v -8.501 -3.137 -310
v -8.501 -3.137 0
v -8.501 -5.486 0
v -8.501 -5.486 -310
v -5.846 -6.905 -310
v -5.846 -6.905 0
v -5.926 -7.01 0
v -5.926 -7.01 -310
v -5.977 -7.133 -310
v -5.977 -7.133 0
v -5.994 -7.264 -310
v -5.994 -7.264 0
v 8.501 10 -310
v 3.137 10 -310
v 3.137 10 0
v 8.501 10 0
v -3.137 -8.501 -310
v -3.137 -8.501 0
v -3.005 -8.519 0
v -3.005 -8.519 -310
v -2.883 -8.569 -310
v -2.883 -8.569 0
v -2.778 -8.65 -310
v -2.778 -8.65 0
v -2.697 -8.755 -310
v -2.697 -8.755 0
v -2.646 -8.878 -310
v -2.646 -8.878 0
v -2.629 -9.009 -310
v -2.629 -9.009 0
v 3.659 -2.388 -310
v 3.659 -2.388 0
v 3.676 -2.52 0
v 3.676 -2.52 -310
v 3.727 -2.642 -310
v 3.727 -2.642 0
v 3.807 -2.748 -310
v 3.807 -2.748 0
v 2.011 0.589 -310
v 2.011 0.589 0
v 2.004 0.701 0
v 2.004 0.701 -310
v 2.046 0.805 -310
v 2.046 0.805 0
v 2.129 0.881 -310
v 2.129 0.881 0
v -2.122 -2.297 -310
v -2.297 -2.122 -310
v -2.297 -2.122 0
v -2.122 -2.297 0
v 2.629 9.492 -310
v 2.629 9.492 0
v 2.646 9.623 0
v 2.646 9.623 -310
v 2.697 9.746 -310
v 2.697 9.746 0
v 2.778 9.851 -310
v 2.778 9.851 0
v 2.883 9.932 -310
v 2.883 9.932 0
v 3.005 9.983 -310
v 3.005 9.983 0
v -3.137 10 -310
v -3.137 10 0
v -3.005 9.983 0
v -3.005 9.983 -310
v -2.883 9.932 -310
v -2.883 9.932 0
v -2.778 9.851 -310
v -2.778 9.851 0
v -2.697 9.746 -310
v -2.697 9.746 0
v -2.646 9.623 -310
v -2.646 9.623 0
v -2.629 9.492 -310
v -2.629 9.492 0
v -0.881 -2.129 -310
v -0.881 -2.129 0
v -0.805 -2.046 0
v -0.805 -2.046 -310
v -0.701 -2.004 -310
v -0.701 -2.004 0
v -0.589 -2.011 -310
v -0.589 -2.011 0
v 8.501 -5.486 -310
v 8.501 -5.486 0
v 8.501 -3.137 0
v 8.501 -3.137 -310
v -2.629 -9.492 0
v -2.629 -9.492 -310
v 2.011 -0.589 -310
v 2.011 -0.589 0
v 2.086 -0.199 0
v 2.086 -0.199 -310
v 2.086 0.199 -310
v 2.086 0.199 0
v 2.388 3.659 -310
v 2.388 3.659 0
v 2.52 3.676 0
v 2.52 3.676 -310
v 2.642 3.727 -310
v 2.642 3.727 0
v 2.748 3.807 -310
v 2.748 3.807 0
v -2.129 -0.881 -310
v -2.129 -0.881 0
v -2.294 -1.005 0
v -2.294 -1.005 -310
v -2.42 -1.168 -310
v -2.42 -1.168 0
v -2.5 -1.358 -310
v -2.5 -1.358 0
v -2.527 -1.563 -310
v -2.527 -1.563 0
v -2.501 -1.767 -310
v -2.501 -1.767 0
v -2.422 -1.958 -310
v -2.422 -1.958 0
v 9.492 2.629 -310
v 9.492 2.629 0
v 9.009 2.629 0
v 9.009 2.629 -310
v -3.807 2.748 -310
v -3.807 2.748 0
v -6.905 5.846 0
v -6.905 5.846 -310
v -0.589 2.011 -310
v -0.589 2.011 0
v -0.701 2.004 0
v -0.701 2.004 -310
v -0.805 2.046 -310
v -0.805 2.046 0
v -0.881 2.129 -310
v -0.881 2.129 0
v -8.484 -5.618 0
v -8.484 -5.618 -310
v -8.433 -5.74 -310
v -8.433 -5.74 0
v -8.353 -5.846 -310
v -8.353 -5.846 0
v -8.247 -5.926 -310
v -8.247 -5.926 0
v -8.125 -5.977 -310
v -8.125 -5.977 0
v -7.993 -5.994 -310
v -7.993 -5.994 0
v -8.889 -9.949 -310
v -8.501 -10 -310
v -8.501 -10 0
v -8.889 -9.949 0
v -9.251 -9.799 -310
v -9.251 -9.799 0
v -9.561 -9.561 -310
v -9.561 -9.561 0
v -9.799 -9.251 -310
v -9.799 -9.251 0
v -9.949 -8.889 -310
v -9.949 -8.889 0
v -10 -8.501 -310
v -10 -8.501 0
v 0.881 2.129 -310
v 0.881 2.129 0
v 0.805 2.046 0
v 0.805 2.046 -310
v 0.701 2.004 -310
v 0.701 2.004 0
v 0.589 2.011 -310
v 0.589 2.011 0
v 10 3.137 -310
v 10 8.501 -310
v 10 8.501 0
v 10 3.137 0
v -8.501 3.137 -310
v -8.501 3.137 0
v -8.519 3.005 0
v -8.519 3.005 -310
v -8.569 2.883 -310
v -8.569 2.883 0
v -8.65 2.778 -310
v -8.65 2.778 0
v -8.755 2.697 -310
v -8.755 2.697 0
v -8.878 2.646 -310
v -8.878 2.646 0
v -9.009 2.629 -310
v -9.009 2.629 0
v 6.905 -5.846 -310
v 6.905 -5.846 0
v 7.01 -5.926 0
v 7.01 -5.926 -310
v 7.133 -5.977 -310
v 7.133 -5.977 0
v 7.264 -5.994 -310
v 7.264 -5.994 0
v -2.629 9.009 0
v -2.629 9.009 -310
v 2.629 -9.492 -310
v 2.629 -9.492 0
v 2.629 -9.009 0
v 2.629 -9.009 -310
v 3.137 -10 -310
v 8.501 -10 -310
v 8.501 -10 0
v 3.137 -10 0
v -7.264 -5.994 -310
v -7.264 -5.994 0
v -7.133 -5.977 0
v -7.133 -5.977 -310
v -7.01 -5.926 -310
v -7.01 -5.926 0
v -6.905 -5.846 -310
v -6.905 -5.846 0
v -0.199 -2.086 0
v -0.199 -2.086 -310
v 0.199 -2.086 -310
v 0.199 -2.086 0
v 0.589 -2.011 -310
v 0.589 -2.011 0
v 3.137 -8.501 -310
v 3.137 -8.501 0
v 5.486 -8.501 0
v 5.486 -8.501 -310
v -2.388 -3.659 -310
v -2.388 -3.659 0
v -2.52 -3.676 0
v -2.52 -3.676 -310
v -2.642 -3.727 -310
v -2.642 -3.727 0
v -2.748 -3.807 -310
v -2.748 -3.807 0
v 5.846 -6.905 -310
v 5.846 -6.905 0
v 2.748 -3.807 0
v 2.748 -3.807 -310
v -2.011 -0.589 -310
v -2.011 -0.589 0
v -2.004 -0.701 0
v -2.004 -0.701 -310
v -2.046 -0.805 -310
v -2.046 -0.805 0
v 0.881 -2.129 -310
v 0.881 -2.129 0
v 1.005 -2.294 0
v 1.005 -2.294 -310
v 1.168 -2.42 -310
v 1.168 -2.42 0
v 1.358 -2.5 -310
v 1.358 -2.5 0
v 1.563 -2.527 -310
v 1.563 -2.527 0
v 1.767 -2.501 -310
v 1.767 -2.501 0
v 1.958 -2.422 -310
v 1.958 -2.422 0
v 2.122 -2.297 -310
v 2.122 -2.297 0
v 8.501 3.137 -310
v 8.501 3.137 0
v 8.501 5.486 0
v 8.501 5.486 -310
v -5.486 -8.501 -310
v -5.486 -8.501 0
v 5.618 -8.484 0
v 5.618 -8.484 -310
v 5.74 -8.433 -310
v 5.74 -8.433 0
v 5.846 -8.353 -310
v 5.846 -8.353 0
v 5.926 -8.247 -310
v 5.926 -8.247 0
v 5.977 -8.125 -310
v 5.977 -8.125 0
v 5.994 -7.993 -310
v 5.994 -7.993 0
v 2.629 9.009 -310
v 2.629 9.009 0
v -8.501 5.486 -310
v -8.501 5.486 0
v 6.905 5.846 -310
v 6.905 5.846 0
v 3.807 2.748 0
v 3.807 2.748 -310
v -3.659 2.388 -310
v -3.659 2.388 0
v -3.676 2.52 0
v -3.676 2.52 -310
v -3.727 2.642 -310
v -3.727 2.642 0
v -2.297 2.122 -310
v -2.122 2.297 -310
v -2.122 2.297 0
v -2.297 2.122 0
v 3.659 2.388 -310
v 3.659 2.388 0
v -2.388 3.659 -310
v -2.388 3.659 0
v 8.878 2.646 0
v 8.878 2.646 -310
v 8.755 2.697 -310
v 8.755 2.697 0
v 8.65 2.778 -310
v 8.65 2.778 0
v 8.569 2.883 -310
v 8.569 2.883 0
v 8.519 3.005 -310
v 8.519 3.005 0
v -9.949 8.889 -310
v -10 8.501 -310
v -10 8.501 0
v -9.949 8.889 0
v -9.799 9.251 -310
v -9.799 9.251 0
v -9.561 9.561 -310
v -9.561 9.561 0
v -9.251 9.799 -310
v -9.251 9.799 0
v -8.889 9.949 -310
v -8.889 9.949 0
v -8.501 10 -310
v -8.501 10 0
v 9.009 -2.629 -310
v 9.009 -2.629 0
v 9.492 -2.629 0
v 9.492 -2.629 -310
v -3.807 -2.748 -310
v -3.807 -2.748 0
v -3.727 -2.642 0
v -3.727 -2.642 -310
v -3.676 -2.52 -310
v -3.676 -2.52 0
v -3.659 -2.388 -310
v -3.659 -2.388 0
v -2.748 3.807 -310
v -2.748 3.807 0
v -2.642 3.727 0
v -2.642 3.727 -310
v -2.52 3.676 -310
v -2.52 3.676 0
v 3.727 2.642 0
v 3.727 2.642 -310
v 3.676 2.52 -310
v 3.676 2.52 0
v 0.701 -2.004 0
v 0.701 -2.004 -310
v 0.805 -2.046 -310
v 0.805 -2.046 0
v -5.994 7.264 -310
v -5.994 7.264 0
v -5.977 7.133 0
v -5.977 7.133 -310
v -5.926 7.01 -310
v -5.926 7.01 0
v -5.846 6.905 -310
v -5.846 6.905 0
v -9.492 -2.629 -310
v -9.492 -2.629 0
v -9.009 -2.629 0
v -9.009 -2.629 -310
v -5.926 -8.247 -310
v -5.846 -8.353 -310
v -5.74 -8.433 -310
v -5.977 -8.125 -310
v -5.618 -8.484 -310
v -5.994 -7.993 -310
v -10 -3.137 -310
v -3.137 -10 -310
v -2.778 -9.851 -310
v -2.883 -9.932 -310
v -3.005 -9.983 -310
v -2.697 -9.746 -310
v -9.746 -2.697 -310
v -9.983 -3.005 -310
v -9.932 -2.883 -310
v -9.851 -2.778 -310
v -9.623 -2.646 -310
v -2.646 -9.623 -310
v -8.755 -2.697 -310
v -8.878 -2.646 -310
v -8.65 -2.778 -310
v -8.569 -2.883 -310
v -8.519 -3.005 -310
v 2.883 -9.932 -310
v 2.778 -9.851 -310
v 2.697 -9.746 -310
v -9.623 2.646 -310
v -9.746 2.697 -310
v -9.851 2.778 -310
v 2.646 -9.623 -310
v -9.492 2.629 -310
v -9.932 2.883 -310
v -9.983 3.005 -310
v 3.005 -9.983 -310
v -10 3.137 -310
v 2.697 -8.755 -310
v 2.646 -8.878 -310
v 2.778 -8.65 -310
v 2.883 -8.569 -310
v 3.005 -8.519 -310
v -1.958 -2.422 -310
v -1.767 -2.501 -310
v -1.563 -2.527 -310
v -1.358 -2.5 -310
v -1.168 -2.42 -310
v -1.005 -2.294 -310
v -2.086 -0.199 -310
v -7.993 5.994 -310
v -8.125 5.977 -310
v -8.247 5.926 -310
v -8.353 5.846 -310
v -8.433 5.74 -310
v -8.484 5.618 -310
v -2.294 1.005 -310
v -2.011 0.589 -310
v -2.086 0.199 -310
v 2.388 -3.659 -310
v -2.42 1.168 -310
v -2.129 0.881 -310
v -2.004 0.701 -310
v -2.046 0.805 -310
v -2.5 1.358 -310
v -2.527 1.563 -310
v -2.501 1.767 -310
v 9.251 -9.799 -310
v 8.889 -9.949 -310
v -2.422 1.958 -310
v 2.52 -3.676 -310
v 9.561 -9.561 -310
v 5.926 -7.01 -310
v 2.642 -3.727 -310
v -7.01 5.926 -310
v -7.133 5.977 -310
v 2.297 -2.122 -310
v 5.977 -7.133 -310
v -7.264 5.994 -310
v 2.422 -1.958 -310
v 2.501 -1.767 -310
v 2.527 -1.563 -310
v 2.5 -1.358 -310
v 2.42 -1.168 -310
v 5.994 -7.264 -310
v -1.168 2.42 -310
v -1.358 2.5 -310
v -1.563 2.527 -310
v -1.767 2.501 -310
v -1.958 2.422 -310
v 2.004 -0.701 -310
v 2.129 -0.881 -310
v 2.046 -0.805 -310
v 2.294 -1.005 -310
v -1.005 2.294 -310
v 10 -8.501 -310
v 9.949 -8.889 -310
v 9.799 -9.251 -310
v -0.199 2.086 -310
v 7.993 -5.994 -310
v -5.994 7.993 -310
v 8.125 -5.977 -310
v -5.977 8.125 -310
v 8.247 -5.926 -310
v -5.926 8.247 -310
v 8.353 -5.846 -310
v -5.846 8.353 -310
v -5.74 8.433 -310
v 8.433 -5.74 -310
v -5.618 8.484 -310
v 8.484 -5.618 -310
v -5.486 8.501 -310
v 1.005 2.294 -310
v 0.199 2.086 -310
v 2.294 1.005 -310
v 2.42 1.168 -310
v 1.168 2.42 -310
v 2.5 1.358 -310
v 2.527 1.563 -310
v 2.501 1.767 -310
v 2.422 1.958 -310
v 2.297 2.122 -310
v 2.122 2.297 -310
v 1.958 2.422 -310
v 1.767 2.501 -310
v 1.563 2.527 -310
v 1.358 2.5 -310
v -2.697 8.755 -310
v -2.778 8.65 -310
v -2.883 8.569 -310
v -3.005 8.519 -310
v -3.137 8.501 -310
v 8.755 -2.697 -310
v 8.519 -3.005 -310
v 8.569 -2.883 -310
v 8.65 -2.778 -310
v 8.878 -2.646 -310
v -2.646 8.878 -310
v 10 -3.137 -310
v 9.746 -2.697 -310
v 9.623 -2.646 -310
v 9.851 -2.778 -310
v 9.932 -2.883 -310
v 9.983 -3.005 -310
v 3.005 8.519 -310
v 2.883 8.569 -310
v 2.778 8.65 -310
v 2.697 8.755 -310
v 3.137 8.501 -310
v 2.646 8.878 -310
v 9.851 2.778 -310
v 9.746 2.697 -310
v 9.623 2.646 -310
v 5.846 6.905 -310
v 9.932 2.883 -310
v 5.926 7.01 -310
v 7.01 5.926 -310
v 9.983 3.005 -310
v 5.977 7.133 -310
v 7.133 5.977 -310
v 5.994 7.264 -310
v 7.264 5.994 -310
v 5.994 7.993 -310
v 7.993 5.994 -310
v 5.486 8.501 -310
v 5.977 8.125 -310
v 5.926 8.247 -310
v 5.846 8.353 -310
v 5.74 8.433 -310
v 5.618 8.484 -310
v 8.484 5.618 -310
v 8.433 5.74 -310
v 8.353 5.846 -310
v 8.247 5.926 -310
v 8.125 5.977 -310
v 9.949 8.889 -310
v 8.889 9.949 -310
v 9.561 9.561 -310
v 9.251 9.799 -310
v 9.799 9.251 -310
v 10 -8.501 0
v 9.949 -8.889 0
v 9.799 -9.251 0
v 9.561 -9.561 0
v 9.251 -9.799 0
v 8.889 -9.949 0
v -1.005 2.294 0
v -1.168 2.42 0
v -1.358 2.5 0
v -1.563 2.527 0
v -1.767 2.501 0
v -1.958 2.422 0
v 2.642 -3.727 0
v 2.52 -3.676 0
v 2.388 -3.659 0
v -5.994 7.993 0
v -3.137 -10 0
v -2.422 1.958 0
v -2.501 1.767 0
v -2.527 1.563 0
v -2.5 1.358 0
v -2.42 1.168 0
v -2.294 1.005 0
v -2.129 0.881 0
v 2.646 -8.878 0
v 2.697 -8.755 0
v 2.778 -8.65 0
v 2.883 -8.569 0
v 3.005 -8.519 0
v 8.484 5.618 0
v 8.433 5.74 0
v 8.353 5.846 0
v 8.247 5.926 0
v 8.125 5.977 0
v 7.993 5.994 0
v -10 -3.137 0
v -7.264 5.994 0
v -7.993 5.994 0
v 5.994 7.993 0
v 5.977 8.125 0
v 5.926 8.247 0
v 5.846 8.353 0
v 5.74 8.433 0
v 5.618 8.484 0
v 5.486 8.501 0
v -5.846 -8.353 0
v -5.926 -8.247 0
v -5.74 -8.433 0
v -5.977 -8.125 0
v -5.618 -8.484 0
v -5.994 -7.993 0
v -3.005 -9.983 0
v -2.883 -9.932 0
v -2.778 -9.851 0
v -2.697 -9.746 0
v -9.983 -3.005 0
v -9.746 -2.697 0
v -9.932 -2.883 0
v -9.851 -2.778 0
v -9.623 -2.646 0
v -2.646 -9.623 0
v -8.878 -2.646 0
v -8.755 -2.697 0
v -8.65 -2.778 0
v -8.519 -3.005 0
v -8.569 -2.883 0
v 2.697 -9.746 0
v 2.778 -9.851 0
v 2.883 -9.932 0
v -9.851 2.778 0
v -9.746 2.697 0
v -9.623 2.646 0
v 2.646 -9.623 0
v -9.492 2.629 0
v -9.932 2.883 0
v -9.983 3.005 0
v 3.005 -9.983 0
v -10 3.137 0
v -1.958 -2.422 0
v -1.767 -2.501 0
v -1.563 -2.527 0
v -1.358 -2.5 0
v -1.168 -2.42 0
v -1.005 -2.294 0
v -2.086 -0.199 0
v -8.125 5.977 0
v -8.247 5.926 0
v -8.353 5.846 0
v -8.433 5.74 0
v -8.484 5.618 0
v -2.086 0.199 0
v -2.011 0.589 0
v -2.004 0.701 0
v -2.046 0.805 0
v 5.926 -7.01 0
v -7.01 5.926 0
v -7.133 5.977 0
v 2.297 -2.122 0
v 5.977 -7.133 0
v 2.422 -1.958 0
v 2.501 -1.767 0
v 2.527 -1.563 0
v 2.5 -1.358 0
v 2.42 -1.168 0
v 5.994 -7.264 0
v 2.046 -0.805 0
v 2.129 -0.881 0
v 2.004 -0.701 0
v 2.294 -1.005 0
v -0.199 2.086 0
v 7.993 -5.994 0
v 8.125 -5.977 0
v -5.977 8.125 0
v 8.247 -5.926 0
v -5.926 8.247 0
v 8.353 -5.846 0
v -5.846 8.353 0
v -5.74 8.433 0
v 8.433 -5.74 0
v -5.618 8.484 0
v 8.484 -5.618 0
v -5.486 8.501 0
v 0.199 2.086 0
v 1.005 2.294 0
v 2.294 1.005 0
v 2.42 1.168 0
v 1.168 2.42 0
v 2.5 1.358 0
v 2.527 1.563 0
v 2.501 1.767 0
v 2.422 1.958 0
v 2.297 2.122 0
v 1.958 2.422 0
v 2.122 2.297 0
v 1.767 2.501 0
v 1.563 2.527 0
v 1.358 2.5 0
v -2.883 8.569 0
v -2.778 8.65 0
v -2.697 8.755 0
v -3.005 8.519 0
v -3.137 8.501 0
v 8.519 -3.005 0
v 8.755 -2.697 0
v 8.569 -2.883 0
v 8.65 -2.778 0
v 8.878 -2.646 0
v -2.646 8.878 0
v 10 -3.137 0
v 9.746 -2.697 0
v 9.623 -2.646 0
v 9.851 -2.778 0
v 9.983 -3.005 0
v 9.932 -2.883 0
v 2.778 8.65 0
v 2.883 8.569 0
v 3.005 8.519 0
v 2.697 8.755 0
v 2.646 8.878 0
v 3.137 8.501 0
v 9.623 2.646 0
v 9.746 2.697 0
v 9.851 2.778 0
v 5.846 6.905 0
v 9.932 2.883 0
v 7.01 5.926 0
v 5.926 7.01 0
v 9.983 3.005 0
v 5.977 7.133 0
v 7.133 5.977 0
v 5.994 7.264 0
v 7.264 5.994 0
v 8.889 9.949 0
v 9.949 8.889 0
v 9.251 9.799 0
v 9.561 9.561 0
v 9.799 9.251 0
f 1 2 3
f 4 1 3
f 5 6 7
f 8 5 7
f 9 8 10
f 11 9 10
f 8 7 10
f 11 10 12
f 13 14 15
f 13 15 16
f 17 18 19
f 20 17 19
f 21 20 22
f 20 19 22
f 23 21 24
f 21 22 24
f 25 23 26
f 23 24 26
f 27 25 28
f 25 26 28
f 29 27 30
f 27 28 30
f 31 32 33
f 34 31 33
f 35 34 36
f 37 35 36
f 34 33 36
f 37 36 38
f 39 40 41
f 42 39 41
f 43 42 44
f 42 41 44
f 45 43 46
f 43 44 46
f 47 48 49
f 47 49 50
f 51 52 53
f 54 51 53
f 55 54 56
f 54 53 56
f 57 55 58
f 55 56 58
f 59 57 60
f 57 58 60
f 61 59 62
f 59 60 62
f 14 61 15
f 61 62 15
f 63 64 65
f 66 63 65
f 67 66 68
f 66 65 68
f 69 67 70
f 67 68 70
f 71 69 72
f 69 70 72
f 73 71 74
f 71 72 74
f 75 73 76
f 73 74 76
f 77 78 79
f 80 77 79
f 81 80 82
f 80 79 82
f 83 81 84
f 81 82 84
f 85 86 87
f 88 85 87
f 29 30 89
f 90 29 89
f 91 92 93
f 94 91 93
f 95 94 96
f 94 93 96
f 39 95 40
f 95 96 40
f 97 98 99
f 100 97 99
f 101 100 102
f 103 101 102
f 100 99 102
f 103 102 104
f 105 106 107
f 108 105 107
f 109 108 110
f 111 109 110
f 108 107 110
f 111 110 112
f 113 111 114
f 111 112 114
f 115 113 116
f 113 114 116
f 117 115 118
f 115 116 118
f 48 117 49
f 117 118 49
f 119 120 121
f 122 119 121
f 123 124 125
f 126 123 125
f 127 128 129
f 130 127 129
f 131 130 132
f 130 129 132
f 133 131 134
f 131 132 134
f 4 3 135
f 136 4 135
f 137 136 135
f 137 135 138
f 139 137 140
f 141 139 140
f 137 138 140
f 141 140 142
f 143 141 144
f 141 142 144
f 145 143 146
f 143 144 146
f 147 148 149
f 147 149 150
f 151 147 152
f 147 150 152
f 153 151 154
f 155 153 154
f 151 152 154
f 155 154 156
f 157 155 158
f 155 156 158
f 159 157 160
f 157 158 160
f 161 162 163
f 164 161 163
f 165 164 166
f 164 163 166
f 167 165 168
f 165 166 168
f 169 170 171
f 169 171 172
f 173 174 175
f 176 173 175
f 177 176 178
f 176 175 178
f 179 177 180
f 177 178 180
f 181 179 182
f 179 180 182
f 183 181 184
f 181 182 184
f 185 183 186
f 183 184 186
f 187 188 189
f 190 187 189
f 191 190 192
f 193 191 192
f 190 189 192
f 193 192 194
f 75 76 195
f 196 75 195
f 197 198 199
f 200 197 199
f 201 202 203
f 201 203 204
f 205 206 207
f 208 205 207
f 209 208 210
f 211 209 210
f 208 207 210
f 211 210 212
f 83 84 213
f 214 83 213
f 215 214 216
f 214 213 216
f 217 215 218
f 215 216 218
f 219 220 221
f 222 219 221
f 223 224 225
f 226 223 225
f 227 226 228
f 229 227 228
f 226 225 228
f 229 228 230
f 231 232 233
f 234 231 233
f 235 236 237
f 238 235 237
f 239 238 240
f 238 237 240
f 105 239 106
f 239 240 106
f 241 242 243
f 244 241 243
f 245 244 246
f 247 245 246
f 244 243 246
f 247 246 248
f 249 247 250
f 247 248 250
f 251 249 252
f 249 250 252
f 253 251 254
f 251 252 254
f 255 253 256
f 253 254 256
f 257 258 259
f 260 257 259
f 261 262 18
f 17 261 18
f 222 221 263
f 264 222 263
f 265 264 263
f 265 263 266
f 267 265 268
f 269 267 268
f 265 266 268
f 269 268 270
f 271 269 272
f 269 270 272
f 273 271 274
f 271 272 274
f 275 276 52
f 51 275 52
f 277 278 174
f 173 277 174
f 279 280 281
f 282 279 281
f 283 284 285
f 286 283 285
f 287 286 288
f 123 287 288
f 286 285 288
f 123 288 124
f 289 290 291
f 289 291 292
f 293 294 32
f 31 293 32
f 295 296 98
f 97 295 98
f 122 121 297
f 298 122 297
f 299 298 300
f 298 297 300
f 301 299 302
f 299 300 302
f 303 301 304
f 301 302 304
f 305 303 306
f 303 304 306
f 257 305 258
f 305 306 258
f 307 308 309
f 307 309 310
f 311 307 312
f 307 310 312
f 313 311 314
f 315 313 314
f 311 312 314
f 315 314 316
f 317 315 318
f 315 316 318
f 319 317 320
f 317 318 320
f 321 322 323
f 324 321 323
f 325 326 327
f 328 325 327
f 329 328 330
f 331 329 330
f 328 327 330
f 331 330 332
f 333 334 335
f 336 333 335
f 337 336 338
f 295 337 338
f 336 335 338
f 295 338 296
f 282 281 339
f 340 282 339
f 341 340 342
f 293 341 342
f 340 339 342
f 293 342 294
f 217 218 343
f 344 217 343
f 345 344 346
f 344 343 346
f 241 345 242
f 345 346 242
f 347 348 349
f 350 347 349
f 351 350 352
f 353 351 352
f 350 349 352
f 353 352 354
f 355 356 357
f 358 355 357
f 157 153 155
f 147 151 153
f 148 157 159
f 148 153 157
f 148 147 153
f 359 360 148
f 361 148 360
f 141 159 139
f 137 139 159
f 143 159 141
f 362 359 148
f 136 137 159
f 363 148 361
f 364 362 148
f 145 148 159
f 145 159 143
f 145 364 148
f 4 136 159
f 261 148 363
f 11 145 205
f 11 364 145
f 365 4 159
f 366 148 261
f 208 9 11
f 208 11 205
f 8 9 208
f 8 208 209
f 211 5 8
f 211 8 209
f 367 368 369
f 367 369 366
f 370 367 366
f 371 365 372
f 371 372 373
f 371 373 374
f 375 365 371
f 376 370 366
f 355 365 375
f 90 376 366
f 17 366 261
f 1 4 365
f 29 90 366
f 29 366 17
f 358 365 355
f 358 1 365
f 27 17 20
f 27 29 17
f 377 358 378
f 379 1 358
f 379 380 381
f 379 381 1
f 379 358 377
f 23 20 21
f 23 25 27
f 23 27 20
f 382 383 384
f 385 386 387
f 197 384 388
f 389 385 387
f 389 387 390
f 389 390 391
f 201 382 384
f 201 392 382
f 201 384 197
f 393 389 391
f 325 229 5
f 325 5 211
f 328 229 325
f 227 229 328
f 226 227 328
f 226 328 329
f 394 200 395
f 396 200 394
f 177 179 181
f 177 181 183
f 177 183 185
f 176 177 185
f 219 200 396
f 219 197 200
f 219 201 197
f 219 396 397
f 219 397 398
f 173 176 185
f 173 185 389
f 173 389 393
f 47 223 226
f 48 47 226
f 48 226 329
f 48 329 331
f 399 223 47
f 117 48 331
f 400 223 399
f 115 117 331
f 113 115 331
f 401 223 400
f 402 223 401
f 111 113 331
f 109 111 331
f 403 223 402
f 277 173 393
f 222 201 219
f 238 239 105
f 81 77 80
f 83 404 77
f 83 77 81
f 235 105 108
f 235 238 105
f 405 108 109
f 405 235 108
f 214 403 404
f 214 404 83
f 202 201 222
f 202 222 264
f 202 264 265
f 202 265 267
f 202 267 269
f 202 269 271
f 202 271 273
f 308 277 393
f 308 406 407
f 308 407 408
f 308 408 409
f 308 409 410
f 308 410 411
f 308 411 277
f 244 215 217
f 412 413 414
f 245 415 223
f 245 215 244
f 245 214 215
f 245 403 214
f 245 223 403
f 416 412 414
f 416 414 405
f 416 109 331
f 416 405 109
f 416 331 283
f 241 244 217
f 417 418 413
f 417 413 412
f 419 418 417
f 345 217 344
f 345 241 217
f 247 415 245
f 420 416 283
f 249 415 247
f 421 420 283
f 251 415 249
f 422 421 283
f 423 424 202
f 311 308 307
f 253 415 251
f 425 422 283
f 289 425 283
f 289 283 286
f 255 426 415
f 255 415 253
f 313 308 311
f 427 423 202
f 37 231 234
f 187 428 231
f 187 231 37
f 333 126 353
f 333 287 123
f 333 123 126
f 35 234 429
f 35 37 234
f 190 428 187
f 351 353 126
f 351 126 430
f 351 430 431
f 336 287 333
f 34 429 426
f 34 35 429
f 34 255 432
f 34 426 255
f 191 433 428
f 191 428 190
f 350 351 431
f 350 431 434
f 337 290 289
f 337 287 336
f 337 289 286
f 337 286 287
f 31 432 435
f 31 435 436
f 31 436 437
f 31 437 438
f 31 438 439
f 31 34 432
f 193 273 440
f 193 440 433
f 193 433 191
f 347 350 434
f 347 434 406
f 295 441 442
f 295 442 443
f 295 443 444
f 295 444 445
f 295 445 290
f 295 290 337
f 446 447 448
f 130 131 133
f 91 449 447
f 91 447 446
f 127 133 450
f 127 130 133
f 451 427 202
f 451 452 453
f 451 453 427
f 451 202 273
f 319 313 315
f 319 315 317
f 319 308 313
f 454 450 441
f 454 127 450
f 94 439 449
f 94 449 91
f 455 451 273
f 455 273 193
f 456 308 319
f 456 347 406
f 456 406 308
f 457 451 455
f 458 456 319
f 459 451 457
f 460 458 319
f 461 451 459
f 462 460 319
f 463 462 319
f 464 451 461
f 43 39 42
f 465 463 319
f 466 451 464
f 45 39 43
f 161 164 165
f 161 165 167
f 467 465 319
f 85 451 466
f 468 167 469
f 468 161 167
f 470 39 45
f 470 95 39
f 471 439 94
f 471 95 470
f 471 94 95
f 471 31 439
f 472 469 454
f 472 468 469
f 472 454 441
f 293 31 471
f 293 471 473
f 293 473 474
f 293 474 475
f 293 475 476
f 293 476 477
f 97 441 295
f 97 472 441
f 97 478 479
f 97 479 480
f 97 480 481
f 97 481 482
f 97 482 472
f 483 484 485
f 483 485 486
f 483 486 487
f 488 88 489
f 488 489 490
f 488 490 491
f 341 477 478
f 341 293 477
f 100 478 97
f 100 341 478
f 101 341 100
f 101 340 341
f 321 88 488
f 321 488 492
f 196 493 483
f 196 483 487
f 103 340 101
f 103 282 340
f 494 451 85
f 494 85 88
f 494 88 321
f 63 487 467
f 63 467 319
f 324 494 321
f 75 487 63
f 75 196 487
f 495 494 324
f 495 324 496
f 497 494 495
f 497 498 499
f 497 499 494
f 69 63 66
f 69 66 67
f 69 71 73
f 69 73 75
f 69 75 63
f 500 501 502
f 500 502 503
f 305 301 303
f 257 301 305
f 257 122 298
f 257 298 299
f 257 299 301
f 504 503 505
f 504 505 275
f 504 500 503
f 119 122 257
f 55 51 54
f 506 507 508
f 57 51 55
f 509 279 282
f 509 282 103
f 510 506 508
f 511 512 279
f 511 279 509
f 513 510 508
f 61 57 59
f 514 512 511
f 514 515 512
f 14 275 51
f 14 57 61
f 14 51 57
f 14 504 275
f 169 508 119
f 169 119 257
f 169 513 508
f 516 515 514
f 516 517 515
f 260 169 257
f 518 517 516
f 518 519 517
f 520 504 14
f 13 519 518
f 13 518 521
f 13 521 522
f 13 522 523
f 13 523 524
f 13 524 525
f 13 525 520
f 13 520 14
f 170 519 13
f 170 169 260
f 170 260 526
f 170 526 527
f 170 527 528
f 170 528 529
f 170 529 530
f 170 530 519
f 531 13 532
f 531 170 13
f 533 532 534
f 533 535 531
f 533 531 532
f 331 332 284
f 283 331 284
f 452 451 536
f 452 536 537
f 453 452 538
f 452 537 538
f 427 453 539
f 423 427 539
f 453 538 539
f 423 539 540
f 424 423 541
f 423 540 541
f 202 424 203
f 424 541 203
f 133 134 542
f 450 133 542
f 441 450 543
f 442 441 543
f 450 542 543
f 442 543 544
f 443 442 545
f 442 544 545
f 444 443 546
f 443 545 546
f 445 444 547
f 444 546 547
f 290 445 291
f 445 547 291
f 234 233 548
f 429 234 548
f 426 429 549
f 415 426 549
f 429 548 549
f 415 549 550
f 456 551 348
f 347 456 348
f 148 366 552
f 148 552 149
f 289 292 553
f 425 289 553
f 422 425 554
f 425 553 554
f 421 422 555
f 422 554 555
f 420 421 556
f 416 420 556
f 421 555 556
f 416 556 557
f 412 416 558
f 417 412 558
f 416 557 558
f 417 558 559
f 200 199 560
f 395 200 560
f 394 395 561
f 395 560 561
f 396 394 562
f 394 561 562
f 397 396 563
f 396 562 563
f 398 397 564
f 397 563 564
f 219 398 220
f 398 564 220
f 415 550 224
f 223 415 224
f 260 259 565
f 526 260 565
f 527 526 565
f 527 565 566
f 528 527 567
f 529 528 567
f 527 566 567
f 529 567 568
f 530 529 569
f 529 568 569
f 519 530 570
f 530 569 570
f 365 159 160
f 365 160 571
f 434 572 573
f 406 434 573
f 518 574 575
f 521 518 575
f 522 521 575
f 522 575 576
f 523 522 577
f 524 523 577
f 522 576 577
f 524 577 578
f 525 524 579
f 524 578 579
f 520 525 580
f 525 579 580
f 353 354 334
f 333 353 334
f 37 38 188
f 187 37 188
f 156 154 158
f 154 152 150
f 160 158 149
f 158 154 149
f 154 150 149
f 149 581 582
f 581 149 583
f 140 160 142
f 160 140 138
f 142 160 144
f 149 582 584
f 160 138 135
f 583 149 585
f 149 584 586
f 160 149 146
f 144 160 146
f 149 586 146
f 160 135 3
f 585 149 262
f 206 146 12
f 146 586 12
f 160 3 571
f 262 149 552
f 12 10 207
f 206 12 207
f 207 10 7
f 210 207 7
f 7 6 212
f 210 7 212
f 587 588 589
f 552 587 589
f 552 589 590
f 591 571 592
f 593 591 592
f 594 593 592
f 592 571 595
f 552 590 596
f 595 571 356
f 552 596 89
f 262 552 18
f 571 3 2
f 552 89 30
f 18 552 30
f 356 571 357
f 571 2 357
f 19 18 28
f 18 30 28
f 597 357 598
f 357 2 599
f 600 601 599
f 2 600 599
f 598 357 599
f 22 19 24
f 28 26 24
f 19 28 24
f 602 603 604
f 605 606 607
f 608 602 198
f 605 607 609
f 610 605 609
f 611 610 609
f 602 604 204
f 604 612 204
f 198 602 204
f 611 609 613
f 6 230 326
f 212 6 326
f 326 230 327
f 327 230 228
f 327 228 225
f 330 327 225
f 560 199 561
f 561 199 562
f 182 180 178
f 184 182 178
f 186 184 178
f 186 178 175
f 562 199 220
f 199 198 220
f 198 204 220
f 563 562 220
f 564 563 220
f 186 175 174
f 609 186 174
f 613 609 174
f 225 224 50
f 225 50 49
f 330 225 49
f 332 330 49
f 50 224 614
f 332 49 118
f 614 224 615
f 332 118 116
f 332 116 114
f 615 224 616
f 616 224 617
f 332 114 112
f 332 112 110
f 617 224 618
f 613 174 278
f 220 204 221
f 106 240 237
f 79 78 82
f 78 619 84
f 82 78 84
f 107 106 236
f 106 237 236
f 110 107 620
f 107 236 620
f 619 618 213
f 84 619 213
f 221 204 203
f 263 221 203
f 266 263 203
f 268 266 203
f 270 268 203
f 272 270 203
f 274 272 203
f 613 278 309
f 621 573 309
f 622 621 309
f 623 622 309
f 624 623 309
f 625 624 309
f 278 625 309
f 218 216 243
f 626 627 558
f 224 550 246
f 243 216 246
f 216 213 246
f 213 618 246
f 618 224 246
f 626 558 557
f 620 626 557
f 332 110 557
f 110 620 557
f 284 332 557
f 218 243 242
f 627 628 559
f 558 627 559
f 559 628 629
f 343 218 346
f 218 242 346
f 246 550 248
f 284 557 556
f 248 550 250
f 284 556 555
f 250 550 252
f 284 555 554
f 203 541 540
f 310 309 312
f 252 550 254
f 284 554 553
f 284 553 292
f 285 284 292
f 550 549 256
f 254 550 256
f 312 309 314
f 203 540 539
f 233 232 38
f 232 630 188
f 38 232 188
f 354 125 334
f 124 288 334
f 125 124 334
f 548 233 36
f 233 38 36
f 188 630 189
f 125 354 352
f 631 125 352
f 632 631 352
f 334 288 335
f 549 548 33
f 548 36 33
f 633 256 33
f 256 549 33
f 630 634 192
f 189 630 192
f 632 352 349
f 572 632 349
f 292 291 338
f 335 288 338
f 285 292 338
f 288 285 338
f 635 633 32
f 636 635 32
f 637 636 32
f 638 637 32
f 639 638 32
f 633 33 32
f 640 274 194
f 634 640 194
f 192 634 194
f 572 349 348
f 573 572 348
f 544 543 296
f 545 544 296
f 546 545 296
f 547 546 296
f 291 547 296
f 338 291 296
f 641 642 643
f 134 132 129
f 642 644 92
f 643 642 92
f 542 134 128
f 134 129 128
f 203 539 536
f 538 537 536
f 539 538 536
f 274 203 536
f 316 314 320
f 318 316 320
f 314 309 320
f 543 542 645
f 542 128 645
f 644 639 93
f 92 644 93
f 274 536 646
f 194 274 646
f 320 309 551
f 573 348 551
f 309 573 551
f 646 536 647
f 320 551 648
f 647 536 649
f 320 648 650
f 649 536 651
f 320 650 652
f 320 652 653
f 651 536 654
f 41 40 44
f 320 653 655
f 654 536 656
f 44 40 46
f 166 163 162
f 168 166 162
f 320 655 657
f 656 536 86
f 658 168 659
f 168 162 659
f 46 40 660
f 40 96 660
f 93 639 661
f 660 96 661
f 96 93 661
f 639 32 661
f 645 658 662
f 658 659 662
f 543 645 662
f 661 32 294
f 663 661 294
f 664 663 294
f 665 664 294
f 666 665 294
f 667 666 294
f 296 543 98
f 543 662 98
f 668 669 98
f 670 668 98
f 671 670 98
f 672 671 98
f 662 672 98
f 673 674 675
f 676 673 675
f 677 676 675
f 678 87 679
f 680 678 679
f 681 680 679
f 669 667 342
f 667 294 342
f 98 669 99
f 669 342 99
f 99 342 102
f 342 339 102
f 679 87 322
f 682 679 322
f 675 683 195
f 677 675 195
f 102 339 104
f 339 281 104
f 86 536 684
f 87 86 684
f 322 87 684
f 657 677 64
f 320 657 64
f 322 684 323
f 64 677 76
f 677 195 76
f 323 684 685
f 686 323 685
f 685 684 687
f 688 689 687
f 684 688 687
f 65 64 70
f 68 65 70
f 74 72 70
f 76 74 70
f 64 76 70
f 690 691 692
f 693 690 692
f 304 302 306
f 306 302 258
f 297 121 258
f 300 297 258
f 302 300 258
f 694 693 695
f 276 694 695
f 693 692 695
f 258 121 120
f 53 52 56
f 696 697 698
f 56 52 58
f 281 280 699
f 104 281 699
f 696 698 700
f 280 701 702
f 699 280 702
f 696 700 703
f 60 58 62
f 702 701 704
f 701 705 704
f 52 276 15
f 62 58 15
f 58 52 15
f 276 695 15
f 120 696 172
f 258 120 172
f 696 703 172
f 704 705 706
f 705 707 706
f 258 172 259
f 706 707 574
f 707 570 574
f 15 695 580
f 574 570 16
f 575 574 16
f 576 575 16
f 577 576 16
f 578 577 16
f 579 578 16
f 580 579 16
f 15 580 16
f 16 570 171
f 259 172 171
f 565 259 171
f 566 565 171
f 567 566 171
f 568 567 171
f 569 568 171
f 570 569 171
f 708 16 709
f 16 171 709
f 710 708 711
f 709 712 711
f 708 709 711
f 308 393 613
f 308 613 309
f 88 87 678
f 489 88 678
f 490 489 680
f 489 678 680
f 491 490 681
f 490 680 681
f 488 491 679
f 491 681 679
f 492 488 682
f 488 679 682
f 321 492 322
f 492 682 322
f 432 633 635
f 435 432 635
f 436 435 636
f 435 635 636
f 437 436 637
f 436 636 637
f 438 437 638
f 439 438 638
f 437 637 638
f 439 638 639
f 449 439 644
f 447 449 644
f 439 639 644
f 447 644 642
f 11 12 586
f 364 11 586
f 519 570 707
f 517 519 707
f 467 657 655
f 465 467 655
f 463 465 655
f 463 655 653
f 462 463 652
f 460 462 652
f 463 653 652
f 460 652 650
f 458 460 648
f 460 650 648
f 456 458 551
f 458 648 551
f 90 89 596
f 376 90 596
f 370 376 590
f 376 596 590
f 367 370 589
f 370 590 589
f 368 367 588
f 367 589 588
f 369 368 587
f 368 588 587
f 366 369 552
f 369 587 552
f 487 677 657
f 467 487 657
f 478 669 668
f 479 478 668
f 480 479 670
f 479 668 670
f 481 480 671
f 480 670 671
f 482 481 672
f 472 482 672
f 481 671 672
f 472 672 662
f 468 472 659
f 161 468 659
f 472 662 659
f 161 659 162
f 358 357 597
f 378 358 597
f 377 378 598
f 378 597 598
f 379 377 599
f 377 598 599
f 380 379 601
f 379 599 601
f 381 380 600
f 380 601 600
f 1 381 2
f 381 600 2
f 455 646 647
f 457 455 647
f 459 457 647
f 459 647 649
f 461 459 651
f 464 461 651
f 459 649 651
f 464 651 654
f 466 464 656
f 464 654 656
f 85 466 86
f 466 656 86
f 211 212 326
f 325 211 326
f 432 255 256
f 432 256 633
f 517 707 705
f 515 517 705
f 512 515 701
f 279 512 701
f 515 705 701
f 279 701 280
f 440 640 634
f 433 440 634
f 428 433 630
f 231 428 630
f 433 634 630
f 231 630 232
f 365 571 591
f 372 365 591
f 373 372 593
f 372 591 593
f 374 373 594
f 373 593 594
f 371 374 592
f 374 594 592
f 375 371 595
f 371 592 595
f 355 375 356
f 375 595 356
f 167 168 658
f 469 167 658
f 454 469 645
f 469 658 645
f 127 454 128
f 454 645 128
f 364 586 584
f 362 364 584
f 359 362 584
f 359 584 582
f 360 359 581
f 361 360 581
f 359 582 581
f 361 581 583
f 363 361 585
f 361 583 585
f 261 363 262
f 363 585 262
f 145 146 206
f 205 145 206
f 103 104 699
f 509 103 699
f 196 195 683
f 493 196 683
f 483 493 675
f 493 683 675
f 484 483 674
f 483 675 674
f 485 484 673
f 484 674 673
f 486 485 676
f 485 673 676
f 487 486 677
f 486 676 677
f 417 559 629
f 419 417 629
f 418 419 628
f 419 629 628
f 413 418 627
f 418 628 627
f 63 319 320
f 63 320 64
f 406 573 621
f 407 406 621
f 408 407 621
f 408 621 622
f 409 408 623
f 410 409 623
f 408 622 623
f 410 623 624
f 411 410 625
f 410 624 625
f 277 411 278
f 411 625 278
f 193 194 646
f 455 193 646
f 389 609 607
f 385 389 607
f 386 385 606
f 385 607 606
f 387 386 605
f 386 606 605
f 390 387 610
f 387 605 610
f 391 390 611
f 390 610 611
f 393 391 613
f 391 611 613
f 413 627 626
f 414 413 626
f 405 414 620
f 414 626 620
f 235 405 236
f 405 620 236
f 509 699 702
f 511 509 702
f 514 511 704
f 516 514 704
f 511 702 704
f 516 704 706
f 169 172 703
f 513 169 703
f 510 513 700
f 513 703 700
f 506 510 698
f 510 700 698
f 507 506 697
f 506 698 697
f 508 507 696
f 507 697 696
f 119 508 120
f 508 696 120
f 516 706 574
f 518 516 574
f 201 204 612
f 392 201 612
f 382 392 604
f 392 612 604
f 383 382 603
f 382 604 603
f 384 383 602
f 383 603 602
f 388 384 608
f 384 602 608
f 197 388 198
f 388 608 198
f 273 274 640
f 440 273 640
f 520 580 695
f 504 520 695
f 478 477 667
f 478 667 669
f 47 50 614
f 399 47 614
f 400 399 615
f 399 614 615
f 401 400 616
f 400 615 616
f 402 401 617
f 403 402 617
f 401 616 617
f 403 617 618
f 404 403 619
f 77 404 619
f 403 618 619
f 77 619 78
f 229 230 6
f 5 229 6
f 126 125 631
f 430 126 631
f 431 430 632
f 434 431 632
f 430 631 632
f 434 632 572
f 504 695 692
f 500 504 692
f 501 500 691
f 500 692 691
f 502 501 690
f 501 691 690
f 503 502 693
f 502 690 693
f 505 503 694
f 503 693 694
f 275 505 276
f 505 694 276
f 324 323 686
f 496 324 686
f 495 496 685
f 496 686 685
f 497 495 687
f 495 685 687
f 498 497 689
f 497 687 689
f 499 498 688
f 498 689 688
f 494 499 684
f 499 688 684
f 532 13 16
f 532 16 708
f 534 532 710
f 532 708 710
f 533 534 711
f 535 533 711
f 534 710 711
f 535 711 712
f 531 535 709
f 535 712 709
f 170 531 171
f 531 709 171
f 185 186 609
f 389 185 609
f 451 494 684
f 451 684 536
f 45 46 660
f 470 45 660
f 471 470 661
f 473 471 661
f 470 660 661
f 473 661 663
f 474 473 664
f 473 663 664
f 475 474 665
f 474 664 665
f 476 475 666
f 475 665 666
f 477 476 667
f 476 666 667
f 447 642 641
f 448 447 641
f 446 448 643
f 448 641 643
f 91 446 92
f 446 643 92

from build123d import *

# Parameters (mm, degrees)
F_20_SERIES_20_2020_1_DEPTH = 310


with BuildPart() as part:
    # Sketch11 → 20_series 20-2020(1) (new body)
    with BuildSketch(Plane.YX):
        with BuildLine():
            Line((9.0094, 2.6289), (9.492, 2.6289))
            ThreePointArc((9.492, 2.6289), (9.851210245, 2.777689755), (10, 3.1369))
            Line((10, 3.1369), (10, 8.5014))
            ThreePointArc((10, 8.5014), (9.561070222, 9.561070222), (8.5014, 10))
            Line((8.5014, 10), (3.1369, 10))
            ThreePointArc((3.1369, 10), (2.777689755, 9.851210245), (2.6289, 9.492))
            Line((2.6289, 9.492), (2.6289, 9.0094))
            ThreePointArc((2.6289, 9.0094), (2.777689755, 8.650189755), (3.1369, 8.5014))
            Line((3.1369, 8.5014), (5.4864, 8.5014))
            ThreePointArc((5.4864, 8.5014), (5.845610245, 8.352610245), (5.9944, 7.9934))
            Line((5.9944, 7.9934), (5.9944, 7.264490712))
            ThreePointArc((5.9944, 7.264490712), (5.955730803, 7.070087528), (5.845610245, 6.905280467))
            Line((5.845610245, 6.905280467), (2.747686782, 3.807357004))
            ThreePointArc((2.747686782, 3.807357004), (2.582879721, 3.697236446), (2.388476537, 3.658567249))
            Line((2.388476537, 3.658567249), (-2.388476537, 3.658567249))
            ThreePointArc((-2.388476537, 3.658567249), (-2.582879721, 3.697236446), (-2.747686782, 3.807357004))
            Line((-2.747686782, 3.807357004), (-5.845610245, 6.905280467))
            ThreePointArc((-5.845610245, 6.905280467), (-5.955730803, 7.070087528), (-5.9944, 7.264490712))
            Line((-5.9944, 7.264490712), (-5.9944, 7.9934))
            ThreePointArc((-5.9944, 7.9934), (-5.845610245, 8.352610245), (-5.4864, 8.5014))
            Line((-5.4864, 8.5014), (-3.1369, 8.5014))
            ThreePointArc((-3.1369, 8.5014), (-2.777689755, 8.650189755), (-2.6289, 9.0094))
            Line((-2.6289, 9.0094), (-2.6289, 9.492))
            ThreePointArc((-2.6289, 9.492), (-2.777689755, 9.851210245), (-3.1369, 10))
            Line((-3.1369, 10), (-8.5014, 10))
            ThreePointArc((-8.5014, 10), (-9.561070222, 9.561070222), (-10, 8.5014))
            Line((-10, 8.5014), (-10, 3.1369))
            ThreePointArc((-10, 3.1369), (-9.851210245, 2.777689755), (-9.492, 2.6289))
            Line((-9.492, 2.6289), (-9.0094, 2.6289))
            ThreePointArc((-9.0094, 2.6289), (-8.650189755, 2.777689755), (-8.5014, 3.1369))
            Line((-8.5014, 3.1369), (-8.5014, 5.4864))
            ThreePointArc((-8.5014, 5.4864), (-8.352610245, 5.845610245), (-7.9934, 5.9944))
            Line((-7.9934, 5.9944), (-7.264490712, 5.9944))
            ThreePointArc((-7.264490712, 5.9944), (-7.070087528, 5.955730803), (-6.905280467, 5.845610245))
            Line((-6.905280467, 5.845610245), (-3.807357004, 2.747686782))
            ThreePointArc((-3.807357004, 2.747686782), (-3.697236446, 2.582879721), (-3.658567249, 2.388476537))
            Line((-3.658567249, 2.388476537), (-3.658567249, -2.388476537))
            ThreePointArc((-3.658567249, -2.388476537), (-3.697236446, -2.582879721), (-3.807357004, -2.747686782))
            Line((-3.807357004, -2.747686782), (-6.905280467, -5.845610245))
            ThreePointArc((-6.905280467, -5.845610245), (-7.070087528, -5.955730803), (-7.264490712, -5.9944))
            Line((-7.264490712, -5.9944), (-7.9934, -5.9944))
            ThreePointArc((-7.9934, -5.9944), (-8.352610245, -5.845610245), (-8.5014, -5.4864))
            Line((-8.5014, -5.4864), (-8.5014, -3.1369))
            ThreePointArc((-8.5014, -3.1369), (-8.650189755, -2.777689755), (-9.0094, -2.6289))
            Line((-9.0094, -2.6289), (-9.492, -2.6289))
            ThreePointArc((-9.492, -2.6289), (-9.851210245, -2.777689755), (-10, -3.1369))
            Line((-10, -3.1369), (-10, -8.5014))
            ThreePointArc((-10, -8.5014), (-9.561070222, -9.561070222), (-8.5014, -10))
            Line((-8.5014, -10), (-3.1369, -10))
            ThreePointArc((-3.1369, -10), (-2.777689755, -9.851210245), (-2.6289, -9.492))
            Line((-2.6289, -9.492), (-2.6289, -9.0094))
            ThreePointArc((-2.6289, -9.0094), (-2.777689755, -8.650189755), (-3.1369, -8.5014))
            Line((-3.1369, -8.5014), (-5.4864, -8.5014))
            ThreePointArc((-5.4864, -8.5014), (-5.845610245, -8.352610245), (-5.9944, -7.9934))
            Line((-5.9944, -7.9934), (-5.9944, -7.264490712))
            ThreePointArc((-5.9944, -7.264490712), (-5.955730803, -7.070087528), (-5.845610245, -6.905280467))
            Line((-5.845610245, -6.905280467), (-2.747686782, -3.807357004))
            ThreePointArc((-2.747686782, -3.807357004), (-2.582879721, -3.697236446), (-2.388476537, -3.658567249))
            Line((-2.388476537, -3.658567249), (2.388476537, -3.658567249))
            ThreePointArc((2.388476537, -3.658567249), (2.582879721, -3.697236446), (2.747686782, -3.807357004))
            Line((2.747686782, -3.807357004), (5.845610245, -6.905280467))
            ThreePointArc((5.845610245, -6.905280467), (5.955730803, -7.070087528), (5.9944, -7.264490712))
            Line((5.9944, -7.264490712), (5.9944, -7.9934))
            ThreePointArc((5.9944, -7.9934), (5.845610245, -8.352610245), (5.4864, -8.5014))
            Line((5.4864, -8.5014), (3.1369, -8.5014))
            ThreePointArc((3.1369, -8.5014), (2.777689755, -8.650189755), (2.6289, -9.0094))
            Line((2.6289, -9.0094), (2.6289, -9.492))
            ThreePointArc((2.6289, -9.492), (2.777689755, -9.851210245), (3.1369, -10))
            Line((3.1369, -10), (8.5014, -10))
            ThreePointArc((8.5014, -10), (9.561070222, -9.561070222), (10, -8.5014))
            Line((10, -8.5014), (10, -3.1369))
            ThreePointArc((10, -3.1369), (9.851210245, -2.777689755), (9.492, -2.6289))
            Line((9.492, -2.6289), (9.0094, -2.6289))
            ThreePointArc((9.0094, -2.6289), (8.650189755, -2.777689755), (8.5014, -3.1369))
            Line((8.5014, -3.1369), (8.5014, -5.4864))
            ThreePointArc((8.5014, -5.4864), (8.352610245, -5.845610245), (7.9934, -5.9944))
            Line((7.9934, -5.9944), (7.264490712, -5.9944))
            ThreePointArc((7.264490712, -5.9944), (7.070087528, -5.955730803), (6.905280467, -5.845610245))
            Line((6.905280467, -5.845610245), (3.807357004, -2.747686782))
            ThreePointArc((3.807357004, -2.747686782), (3.697236446, -2.582879721), (3.658567249, -2.388476537))
            Line((3.658567249, -2.388476537), (3.658567249, 2.388476537))
            ThreePointArc((3.658567249, 2.388476537), (3.697236446, 2.582879721), (3.807357004, 2.747686782))
            Line((3.807357004, 2.747686782), (6.905280467, 5.845610245))
            ThreePointArc((6.905280467, 5.845610245), (7.070087528, 5.955730803), (7.264490712, 5.9944))
            Line((7.264490712, 5.9944), (7.9934, 5.9944))
            ThreePointArc((7.9934, 5.9944), (8.352610245, 5.845610245), (8.5014, 5.4864))
            Line((8.5014, 5.4864), (8.5014, 3.1369))
            ThreePointArc((8.5014, 3.1369), (8.650189755, 2.777689755), (9.0094, 2.6289))
        make_face()
        with BuildLine():
            Line((-2.296558466, 2.121727546), (-2.121727546, 2.296558466))
            ThreePointArc((-2.121727546, 2.296558466), (-1.459775814, 2.520126613), (-0.880635441, 2.129282347))
            ThreePointArc((-0.880635441, 2.129282347), (-0.755121693, 2.019456424), (-0.588548999, 2.011151493))
            ThreePointArc((-0.588548999, 2.011151493), (0, 2.0955), (0.588548999, 2.011151493))
            ThreePointArc((0.588548999, 2.011151493), (0.755121693, 2.019456424), (0.880635441, 2.129282347))
            ThreePointArc((0.880635441, 2.129282347), (1.459775814, 2.520126613), (2.121727546, 2.296558466))
            Line((2.121727546, 2.296558466), (2.296558466, 2.121727546))
            ThreePointArc((2.296558466, 2.121727546), (2.520126613, 1.459775814), (2.129282347, 0.880635441))
            ThreePointArc((2.129282347, 0.880635441), (2.019456424, 0.755121693), (2.011151493, 0.588548999))
            ThreePointArc((2.011151493, 0.588548999), (2.0955, 0), (2.011151493, -0.588548999))
            ThreePointArc((2.011151493, -0.588548999), (2.019456424, -0.755121693), (2.129282347, -0.880635441))
            ThreePointArc((2.129282347, -0.880635441), (2.520126613, -1.459775814), (2.296558466, -2.121727546))
            Line((2.296558466, -2.121727546), (2.121727546, -2.296558466))
            ThreePointArc((2.121727546, -2.296558466), (1.459775814, -2.520126613), (0.880635441, -2.129282347))
            ThreePointArc((0.880635441, -2.129282347), (0.755121693, -2.019456424), (0.588548999, -2.011151493))
            ThreePointArc((0.588548999, -2.011151493), (0, -2.0955), (-0.588548999, -2.011151493))
            ThreePointArc((-0.588548999, -2.011151493), (-0.755121693, -2.019456424), (-0.880635441, -2.129282347))
            ThreePointArc((-0.880635441, -2.129282347), (-1.459775814, -2.520126613), (-2.121727546, -2.296558466))
            Line((-2.121727546, -2.296558466), (-2.296558466, -2.121727546))
            ThreePointArc((-2.296558466, -2.121727546), (-2.520126613, -1.459775814), (-2.129282347, -0.880635441))
            ThreePointArc((-2.129282347, -0.880635441), (-2.019456424, -0.755121693), (-2.011151493, -0.588548999))
            ThreePointArc((-2.011151493, -0.588548999), (-2.0955, 0), (-2.011151493, 0.588548999))
            ThreePointArc((-2.011151493, 0.588548999), (-2.019456424, 0.755121693), (-2.129282347, 0.880635441))
            ThreePointArc((-2.129282347, 0.880635441), (-2.520126613, 1.459775814), (-2.296558466, 2.121727546))
        make_face(mode=Mode.SUBTRACT)
    extrude(amount=F_20_SERIES_20_2020_1_DEPTH)


solid = part.part
